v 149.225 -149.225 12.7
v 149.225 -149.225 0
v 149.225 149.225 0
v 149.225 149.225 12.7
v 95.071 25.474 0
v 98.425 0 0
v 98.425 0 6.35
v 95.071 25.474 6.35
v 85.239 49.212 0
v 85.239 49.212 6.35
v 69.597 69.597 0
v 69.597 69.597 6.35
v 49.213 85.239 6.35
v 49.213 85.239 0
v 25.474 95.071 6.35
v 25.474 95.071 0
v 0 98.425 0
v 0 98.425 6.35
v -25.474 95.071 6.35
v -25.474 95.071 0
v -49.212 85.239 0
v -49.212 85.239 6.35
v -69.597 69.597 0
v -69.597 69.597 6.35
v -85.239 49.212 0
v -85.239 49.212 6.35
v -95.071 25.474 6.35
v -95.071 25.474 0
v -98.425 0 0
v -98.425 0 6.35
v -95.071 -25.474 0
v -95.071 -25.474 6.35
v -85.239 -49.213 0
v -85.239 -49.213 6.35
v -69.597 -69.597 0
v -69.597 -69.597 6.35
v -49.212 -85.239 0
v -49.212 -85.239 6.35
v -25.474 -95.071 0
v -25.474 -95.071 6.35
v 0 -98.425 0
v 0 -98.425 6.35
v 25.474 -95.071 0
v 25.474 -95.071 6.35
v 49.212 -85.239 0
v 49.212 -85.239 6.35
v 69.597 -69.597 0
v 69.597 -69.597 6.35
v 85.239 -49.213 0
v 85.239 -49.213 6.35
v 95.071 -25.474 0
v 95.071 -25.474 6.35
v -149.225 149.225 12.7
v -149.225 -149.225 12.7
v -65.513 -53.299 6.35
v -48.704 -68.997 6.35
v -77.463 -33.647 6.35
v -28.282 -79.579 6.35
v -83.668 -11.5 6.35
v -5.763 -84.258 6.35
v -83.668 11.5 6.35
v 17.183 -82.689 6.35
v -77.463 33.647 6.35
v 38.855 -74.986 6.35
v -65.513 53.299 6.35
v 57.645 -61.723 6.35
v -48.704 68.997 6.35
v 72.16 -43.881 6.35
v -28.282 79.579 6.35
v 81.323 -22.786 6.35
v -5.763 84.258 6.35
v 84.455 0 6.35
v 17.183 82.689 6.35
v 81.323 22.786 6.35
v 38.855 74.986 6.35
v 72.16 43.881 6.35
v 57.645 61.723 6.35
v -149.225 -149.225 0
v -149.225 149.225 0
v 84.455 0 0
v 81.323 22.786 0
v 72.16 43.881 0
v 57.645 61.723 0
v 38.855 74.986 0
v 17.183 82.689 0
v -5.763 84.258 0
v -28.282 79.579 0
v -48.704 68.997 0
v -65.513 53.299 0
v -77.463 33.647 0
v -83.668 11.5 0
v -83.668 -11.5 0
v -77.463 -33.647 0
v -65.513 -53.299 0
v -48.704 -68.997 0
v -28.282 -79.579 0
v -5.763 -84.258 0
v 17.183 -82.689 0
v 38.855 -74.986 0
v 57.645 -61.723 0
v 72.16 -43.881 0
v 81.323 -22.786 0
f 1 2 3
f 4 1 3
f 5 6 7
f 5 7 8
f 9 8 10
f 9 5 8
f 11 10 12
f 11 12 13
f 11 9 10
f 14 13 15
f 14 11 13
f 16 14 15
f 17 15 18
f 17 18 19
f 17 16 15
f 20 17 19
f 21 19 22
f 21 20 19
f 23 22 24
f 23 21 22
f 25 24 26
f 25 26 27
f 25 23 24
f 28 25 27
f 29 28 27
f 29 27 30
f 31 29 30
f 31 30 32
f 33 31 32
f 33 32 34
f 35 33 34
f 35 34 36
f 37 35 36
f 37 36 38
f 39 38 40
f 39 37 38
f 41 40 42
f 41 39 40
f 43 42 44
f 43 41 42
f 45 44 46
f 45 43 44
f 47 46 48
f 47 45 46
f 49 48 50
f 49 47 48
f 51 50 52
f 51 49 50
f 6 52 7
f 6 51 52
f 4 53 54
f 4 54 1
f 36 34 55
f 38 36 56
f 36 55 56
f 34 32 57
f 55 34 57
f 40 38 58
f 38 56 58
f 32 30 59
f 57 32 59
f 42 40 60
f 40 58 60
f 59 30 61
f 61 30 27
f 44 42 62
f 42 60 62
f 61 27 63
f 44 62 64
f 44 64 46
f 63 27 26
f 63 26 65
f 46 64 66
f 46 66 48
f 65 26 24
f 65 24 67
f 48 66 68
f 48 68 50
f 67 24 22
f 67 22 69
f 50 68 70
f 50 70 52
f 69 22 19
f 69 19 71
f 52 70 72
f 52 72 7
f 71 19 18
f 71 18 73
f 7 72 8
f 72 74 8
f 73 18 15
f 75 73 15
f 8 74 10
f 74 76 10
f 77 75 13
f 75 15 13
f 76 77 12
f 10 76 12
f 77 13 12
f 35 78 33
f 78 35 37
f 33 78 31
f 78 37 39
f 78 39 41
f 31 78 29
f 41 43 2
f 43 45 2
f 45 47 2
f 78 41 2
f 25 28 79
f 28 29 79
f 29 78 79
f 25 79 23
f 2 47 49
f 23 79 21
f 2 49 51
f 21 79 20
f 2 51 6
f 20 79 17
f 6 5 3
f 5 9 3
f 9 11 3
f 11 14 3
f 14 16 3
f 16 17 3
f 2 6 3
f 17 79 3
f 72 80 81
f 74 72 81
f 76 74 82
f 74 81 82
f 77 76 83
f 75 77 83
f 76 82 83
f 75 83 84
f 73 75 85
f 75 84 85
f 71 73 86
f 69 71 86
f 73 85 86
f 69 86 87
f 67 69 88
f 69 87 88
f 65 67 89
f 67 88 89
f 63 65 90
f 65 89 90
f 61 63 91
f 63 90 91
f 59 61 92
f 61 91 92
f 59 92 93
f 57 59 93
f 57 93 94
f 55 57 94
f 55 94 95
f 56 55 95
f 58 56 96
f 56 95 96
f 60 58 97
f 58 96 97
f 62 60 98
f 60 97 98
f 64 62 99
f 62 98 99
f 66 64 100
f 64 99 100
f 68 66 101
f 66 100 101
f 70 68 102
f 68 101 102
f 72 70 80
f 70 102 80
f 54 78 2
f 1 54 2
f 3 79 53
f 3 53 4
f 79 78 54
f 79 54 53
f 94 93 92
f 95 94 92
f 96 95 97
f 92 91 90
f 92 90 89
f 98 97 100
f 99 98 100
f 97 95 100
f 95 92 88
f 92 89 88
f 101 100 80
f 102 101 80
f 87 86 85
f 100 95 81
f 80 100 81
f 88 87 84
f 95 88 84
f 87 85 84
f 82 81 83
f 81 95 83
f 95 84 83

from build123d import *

# Parameters (mm, degrees)
F0_W     = 298.45
F0_H     = 298.45
F0_R     = 98.425
F0_R_2   = 84.455
F1_DEPTH = 12.7
F2_DEPTH = 6.35


with BuildPart() as f1:
    # F0 (on Top) → F1 (new body)
    with BuildSketch(Plane.XY):
        Rectangle(F0_W, F0_H)
        Circle(F0_R, mode=Mode.SUBTRACT)
        Circle(F0_R)
        Circle(F0_R_2, mode=Mode.SUBTRACT)
        Circle(F0_R_2)
    extrude(amount=F1_DEPTH)

    # F0 (on Top) → F2 (cut)
    with BuildSketch(Plane.XY):
        Circle(F0_R)
        Circle(F0_R_2, mode=Mode.SUBTRACT)
    extrude(amount=F2_DEPTH, mode=Mode.SUBTRACT)


solid = f1.part
